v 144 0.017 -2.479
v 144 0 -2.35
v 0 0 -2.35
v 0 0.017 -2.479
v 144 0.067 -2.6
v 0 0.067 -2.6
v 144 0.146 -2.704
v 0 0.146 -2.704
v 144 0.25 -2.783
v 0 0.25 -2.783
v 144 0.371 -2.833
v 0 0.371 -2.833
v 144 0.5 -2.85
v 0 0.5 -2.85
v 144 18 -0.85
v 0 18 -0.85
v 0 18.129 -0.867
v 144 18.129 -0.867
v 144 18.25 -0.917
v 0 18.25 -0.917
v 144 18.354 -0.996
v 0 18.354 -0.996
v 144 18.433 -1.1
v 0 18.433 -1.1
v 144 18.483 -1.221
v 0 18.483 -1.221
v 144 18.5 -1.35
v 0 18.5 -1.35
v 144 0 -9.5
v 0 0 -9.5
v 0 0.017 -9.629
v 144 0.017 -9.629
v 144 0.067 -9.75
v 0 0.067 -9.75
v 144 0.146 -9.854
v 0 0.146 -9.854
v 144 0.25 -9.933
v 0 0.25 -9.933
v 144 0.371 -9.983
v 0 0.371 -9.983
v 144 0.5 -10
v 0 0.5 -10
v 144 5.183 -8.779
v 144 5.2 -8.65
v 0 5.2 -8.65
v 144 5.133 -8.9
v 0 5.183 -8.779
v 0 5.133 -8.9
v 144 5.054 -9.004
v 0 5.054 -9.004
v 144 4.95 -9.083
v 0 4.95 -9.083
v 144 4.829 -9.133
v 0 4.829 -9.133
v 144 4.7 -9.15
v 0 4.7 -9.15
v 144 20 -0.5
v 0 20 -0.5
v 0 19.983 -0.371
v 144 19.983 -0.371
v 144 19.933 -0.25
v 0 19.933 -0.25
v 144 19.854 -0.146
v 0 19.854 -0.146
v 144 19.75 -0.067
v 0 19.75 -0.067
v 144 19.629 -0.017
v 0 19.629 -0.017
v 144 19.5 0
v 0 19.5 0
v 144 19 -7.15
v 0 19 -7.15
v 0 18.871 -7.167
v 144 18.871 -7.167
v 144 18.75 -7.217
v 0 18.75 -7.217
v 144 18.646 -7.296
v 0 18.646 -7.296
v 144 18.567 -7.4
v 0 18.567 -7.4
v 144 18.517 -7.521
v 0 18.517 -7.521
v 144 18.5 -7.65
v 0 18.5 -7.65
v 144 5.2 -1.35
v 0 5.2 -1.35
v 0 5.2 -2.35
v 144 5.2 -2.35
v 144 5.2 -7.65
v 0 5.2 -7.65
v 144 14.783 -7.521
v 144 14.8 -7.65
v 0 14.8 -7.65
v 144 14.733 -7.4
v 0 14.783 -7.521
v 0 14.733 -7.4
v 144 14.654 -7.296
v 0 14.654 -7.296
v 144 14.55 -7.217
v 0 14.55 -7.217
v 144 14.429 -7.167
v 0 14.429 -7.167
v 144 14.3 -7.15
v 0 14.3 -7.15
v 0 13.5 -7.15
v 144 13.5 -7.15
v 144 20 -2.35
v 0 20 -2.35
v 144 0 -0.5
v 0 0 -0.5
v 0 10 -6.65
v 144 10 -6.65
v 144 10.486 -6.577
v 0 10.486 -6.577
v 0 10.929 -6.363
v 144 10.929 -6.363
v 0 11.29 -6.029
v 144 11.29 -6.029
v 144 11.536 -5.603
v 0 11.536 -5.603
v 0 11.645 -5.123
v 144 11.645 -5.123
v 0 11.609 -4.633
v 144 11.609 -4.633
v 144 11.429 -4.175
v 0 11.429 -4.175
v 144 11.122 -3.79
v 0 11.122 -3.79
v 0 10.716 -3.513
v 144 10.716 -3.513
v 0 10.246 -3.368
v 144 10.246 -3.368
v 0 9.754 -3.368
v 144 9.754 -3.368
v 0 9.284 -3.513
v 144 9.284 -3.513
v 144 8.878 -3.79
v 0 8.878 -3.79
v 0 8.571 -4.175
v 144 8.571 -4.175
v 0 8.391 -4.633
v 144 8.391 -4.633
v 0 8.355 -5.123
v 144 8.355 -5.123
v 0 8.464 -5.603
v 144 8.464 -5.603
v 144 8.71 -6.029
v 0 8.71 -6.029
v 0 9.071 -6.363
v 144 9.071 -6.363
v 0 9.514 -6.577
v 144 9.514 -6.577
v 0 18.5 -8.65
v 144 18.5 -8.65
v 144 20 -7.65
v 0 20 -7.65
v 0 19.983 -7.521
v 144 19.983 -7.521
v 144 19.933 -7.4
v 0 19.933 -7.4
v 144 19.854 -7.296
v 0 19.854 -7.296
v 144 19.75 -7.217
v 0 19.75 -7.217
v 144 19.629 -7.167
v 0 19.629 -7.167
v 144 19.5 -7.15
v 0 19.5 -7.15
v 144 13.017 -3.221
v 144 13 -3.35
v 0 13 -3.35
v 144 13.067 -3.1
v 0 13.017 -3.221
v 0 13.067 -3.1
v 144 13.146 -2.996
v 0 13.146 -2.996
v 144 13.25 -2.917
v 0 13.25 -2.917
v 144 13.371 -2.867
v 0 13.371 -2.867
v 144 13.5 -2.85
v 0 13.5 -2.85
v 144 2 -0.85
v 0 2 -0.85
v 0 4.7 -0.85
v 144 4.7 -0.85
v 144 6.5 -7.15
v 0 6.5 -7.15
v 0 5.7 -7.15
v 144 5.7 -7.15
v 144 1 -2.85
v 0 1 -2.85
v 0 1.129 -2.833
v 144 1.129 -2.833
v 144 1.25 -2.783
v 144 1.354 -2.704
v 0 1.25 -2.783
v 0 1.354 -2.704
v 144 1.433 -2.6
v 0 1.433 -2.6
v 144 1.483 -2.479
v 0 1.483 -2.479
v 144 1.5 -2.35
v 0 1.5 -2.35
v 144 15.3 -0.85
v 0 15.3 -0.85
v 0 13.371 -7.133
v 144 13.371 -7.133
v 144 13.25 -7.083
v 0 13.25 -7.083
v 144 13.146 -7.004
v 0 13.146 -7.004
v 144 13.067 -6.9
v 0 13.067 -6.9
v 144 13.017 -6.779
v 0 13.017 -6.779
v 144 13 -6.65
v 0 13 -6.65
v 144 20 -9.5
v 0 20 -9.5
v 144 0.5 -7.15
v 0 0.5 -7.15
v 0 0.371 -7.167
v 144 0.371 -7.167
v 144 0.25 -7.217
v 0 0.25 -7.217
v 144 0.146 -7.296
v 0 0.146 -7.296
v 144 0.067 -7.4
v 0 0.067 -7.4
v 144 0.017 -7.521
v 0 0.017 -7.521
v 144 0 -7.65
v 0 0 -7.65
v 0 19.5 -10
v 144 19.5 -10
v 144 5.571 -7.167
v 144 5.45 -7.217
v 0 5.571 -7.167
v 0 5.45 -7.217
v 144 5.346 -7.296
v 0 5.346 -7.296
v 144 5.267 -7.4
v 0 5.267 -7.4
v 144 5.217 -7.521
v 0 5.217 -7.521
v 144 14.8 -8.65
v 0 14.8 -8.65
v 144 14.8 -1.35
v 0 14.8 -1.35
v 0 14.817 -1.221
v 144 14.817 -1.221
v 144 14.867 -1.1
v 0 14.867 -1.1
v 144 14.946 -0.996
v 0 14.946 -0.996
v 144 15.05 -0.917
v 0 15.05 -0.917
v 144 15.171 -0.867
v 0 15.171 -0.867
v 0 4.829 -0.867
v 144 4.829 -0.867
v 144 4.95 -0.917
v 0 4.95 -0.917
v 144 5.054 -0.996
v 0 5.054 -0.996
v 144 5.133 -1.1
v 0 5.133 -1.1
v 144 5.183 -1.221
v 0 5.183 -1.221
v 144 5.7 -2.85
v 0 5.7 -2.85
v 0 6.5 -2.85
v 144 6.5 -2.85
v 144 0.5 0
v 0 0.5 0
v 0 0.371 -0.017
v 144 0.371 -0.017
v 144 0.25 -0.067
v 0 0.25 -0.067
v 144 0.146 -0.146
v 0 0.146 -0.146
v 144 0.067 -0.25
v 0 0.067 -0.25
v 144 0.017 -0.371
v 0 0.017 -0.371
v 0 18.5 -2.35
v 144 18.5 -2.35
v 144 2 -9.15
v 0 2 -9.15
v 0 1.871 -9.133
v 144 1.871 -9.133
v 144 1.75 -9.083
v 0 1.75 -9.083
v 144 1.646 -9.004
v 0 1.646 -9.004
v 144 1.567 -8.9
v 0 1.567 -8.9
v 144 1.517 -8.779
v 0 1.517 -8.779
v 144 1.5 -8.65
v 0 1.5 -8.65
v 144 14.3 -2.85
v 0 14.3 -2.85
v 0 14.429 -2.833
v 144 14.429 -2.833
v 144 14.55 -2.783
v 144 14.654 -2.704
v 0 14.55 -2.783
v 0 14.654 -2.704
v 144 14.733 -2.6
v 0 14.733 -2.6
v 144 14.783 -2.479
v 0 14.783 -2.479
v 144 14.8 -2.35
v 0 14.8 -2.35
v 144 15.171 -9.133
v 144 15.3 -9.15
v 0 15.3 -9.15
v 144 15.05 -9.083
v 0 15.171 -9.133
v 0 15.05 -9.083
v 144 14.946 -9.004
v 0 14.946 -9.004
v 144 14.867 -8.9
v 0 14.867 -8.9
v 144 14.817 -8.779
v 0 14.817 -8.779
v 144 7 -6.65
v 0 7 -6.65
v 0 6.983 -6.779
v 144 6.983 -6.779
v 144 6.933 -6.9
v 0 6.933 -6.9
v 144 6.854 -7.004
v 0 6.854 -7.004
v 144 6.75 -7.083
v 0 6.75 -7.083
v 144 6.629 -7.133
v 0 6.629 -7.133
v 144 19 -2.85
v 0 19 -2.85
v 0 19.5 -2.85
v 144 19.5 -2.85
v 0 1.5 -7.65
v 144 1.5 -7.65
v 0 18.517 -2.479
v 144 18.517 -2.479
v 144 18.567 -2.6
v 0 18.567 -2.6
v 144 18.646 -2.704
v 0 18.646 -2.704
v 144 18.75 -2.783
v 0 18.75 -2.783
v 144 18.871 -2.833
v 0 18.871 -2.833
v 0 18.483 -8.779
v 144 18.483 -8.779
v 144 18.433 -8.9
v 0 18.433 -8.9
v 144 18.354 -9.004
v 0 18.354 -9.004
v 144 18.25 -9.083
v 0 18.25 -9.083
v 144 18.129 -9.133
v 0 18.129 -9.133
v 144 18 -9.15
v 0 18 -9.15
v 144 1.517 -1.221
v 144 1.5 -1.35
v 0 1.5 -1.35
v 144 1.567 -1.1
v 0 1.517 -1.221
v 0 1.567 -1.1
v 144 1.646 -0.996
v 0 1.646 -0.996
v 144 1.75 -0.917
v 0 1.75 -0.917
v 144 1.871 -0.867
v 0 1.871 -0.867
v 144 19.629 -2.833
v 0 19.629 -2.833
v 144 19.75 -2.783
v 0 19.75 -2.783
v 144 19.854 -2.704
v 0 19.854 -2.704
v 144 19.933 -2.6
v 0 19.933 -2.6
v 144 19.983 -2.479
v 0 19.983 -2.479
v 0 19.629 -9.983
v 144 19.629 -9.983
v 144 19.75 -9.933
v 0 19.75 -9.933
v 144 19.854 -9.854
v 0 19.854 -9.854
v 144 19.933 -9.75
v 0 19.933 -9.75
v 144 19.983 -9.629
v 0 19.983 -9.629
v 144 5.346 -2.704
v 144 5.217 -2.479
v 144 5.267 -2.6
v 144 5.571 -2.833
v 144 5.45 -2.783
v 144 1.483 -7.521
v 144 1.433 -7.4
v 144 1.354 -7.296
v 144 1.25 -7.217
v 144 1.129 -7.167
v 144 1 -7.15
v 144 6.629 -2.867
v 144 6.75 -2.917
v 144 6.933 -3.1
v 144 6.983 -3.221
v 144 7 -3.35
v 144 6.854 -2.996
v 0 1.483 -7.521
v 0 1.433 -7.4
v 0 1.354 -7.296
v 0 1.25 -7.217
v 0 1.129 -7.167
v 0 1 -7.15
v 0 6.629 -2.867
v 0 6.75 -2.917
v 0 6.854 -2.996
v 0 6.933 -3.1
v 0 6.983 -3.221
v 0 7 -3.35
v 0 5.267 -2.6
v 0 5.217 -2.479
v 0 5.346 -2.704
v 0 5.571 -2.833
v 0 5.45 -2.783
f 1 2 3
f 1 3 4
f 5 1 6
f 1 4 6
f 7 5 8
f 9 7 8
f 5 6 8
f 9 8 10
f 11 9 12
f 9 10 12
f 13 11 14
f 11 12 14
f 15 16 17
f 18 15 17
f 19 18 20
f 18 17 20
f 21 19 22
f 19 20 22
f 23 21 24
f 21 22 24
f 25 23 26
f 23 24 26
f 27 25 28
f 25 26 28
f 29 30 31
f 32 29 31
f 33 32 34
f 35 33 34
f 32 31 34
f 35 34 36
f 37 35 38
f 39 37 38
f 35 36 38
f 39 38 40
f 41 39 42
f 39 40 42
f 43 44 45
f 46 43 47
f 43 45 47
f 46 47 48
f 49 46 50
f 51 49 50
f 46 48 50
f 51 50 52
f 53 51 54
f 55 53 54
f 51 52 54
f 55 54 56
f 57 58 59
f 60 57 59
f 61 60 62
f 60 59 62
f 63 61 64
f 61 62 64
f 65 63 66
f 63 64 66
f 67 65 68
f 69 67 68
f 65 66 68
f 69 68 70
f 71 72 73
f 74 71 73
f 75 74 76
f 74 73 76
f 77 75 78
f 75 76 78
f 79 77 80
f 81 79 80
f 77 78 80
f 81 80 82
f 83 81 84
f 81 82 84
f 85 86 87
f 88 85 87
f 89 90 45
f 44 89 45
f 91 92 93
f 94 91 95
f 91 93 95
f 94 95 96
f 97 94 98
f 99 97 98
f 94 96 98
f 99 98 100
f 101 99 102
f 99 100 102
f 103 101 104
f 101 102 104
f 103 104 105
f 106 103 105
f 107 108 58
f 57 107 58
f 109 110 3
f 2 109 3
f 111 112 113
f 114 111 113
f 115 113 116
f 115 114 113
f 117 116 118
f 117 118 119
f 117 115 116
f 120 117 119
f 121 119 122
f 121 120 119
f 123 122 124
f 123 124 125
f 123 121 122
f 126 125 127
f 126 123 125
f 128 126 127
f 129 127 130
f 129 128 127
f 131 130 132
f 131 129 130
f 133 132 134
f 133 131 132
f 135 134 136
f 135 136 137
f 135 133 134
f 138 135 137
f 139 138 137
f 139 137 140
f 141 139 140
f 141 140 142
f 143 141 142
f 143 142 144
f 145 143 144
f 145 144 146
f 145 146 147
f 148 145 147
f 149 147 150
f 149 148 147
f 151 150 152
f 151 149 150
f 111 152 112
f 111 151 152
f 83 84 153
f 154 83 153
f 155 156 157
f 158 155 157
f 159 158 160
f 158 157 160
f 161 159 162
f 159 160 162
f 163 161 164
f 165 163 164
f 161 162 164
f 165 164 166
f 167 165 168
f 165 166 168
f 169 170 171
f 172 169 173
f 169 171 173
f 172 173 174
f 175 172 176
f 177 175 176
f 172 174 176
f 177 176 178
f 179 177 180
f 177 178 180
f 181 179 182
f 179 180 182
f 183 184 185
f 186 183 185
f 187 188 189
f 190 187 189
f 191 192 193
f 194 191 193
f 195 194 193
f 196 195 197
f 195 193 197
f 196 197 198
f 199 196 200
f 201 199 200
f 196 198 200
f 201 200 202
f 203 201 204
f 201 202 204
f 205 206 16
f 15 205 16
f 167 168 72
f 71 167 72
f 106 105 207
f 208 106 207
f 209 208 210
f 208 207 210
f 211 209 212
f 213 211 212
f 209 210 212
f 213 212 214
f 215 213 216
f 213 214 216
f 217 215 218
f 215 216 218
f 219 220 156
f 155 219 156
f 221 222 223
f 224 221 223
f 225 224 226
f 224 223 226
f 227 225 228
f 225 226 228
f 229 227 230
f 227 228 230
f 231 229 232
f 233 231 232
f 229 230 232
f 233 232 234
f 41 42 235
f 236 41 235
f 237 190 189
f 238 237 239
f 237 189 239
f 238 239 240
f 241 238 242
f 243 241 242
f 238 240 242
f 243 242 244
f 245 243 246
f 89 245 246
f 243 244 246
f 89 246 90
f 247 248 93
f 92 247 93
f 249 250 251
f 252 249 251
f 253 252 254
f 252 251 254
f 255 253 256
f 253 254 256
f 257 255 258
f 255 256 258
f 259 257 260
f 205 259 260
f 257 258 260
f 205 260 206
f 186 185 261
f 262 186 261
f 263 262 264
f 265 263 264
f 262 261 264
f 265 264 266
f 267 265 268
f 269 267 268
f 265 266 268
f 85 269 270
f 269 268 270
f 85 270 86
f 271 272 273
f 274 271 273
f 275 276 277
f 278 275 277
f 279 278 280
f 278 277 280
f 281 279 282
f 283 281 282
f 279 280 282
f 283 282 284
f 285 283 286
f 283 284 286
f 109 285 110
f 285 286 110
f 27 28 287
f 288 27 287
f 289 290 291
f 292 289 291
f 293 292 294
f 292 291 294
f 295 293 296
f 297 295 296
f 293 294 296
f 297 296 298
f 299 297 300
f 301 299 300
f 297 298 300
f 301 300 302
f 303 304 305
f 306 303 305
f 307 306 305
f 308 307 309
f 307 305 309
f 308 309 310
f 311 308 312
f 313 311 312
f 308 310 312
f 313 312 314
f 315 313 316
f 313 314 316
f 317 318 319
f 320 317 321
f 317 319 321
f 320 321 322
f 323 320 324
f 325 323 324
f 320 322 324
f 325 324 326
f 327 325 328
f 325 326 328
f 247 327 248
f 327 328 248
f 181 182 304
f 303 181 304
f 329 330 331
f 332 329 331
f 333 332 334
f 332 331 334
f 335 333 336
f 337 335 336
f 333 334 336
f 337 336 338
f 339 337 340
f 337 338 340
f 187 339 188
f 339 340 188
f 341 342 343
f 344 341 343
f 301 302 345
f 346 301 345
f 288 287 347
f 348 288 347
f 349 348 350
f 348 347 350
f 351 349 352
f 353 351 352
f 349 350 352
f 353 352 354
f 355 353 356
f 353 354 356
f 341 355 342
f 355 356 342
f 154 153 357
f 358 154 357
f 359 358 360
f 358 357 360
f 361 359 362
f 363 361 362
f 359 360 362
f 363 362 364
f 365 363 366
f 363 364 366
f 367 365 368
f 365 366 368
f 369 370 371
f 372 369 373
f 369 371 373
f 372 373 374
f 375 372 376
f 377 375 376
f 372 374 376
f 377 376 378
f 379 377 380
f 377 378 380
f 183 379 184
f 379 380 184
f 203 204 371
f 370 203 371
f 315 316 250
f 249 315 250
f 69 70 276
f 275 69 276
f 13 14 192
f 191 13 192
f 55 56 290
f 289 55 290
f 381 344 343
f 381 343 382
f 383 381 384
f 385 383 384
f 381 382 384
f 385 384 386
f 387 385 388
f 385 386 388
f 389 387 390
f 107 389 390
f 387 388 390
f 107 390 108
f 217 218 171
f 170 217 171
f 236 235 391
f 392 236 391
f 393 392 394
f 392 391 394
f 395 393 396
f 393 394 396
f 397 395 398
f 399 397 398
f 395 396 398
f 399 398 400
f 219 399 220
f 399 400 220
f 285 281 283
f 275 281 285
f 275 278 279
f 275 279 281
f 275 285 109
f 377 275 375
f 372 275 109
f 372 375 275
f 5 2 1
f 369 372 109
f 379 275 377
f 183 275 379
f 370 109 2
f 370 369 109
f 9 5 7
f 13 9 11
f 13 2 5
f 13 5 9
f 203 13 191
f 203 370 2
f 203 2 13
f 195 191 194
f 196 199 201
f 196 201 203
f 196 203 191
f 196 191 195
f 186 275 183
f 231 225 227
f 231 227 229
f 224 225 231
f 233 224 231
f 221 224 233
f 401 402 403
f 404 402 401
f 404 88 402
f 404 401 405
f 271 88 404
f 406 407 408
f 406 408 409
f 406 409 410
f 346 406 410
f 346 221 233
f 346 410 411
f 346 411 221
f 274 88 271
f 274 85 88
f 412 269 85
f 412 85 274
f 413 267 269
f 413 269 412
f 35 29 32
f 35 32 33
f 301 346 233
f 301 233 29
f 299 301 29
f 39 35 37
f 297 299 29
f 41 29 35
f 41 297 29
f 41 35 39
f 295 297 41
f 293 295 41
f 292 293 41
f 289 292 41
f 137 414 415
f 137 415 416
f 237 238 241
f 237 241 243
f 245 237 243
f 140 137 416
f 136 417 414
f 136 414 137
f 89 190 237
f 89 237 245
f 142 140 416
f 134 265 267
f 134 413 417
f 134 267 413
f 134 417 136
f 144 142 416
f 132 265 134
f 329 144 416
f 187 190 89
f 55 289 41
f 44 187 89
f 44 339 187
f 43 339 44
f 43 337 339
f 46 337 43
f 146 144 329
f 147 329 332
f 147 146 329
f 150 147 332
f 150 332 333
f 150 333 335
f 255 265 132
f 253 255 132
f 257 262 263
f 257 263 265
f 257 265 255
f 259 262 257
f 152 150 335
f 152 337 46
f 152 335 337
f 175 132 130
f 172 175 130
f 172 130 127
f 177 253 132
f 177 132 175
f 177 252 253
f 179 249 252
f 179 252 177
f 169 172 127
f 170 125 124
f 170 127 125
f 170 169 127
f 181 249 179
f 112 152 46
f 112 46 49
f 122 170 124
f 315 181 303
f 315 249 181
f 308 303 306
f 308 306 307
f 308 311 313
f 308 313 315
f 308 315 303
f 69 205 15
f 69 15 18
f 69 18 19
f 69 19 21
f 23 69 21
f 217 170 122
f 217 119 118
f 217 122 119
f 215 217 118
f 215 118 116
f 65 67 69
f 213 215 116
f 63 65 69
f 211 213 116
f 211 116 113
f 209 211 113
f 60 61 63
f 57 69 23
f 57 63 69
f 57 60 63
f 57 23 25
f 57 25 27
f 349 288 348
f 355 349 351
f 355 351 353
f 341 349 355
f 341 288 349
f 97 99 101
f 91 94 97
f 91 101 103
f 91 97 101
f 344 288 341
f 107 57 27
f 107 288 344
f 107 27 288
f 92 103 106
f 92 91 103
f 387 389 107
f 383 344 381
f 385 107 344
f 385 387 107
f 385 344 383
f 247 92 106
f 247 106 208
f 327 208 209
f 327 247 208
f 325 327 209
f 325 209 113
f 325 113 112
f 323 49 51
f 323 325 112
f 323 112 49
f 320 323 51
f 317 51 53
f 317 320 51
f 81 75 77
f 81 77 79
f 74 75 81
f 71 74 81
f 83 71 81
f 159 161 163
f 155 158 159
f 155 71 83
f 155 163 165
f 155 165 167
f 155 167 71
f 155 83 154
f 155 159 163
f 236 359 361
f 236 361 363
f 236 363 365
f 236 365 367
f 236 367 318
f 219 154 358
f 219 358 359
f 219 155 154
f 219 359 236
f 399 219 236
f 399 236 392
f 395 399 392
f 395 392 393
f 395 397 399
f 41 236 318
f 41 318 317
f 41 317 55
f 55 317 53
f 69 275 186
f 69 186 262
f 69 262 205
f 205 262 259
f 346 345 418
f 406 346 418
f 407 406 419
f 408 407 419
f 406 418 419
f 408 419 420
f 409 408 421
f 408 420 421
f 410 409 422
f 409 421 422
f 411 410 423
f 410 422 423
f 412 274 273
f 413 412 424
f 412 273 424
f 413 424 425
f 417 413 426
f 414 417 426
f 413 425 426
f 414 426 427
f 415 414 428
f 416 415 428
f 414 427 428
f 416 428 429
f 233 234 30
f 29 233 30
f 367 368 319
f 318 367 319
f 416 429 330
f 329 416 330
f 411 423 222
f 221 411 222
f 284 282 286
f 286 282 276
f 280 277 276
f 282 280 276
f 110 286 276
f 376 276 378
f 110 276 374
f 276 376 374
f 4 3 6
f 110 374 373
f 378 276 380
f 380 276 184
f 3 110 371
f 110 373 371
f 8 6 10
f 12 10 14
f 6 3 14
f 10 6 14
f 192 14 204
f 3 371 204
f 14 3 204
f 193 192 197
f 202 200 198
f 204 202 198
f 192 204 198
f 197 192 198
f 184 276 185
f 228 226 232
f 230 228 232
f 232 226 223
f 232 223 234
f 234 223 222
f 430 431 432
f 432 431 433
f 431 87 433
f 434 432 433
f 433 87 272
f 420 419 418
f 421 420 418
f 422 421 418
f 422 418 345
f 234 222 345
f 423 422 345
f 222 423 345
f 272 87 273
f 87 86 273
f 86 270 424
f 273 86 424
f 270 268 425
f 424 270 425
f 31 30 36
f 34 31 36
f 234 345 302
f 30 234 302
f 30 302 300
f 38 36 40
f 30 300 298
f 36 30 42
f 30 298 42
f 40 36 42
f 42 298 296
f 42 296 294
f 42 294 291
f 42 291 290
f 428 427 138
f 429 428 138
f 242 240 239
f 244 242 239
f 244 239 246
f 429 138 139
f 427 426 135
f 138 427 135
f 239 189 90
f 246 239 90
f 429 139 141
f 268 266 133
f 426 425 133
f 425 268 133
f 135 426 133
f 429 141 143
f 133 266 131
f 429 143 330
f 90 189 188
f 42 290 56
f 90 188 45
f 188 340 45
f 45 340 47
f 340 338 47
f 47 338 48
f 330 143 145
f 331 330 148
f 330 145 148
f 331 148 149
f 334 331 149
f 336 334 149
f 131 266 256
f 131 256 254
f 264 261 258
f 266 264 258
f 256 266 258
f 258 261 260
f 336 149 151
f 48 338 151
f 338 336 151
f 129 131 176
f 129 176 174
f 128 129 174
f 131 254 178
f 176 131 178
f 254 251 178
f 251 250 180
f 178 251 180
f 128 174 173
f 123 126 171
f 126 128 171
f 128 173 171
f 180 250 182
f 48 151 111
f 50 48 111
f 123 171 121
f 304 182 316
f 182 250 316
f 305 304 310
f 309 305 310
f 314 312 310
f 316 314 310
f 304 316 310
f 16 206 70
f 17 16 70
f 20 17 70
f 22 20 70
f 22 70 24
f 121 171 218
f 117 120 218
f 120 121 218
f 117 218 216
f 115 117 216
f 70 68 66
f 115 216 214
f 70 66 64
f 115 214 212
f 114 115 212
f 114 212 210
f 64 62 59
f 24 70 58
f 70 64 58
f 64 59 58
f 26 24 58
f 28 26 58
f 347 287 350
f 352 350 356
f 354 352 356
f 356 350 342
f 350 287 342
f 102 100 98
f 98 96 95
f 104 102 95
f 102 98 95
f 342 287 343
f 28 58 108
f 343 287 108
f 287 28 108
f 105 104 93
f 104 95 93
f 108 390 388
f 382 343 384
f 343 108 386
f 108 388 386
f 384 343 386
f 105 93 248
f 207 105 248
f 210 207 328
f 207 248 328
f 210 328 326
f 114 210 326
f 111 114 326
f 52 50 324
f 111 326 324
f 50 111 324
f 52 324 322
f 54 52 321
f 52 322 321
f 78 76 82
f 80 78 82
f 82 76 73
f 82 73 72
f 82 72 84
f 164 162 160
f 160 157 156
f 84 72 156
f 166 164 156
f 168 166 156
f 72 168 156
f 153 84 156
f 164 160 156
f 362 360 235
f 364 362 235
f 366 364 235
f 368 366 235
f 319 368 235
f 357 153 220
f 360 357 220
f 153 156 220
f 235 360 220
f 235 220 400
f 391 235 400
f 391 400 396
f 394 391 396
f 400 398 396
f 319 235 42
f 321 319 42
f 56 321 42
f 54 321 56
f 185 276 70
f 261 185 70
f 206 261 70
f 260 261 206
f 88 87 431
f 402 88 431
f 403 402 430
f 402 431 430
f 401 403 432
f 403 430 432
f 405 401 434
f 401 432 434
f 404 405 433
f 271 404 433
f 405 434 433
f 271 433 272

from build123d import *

# Parameters (mm, degrees)
SKETCH_1_R      = 1.65
EXTRUDE_1_DEPTH = 144


with BuildPart() as part:
    # ｽｹｯﾁ1 → ﾎﾞｽ - 押し出し1 (new body)
    with BuildSketch(Plane(origin=(0, 0, 0), x_dir=(0, 0, -1), z_dir=(1, 0, 0))):
        with BuildLine():
            Line((0.5, 0), (2.35, 0))
            ThreePointArc((2.35, 0), (2.703553391, 0.146446609), (2.85, 0.5))
            Line((2.85, 0.5), (2.85, 1))
            ThreePointArc((2.85, 1), (2.703553391, 1.353553391), (2.35, 1.5))
            Line((2.35, 1.5), (1.35, 1.5))
            ThreePointArc((1.35, 1.5), (0.996446609, 1.646446609), (0.85, 2))
            Line((0.85, 2), (0.85, 4.7))
            ThreePointArc((0.85, 4.7), (0.996446609, 5.053553391), (1.35, 5.2))
            Line((1.35, 5.2), (2.35, 5.2))
            ThreePointArc((2.35, 5.2), (2.703553391, 5.346446609), (2.85, 5.7))
            Line((2.85, 5.7), (2.85, 6.5))
            ThreePointArc((2.85, 6.5), (2.996446609, 6.853553391), (3.35, 7))
            Line((3.35, 7), (6.65, 7))
            ThreePointArc((6.65, 7), (7.003553391, 6.853553391), (7.15, 6.5))
            Line((7.15, 6.5), (7.15, 5.7))
            ThreePointArc((7.15, 5.7), (7.296446609, 5.346446609), (7.65, 5.2))
            Line((7.65, 5.2), (8.65, 5.2))
            ThreePointArc((8.65, 5.2), (9.003553391, 5.053553391), (9.15, 4.7))
            Line((9.15, 4.7), (9.15, 2))
            ThreePointArc((9.15, 2), (9.003553391, 1.646446609), (8.65, 1.5))
            Line((8.65, 1.5), (7.65, 1.5))
            ThreePointArc((7.65, 1.5), (7.296446609, 1.353553391), (7.15, 1))
            Line((7.15, 1), (7.15, 0.5))
            ThreePointArc((7.15, 0.5), (7.296446609, 0.146446609), (7.65, 0))
            Line((7.65, 0), (9.5, 0))
            ThreePointArc((9.5, 0), (9.853553391, 0.146446609), (10, 0.5))
            Line((10, 0.5), (10, 19.5))
            ThreePointArc((10, 19.5), (9.853553391, 19.853553391), (9.5, 20))
            Line((9.5, 20), (7.65, 20))
            ThreePointArc((7.65, 20), (7.296446609, 19.853553391), (7.15, 19.5))
            Line((7.15, 19.5), (7.15, 19))
            ThreePointArc((7.15, 19), (7.296446609, 18.646446609), (7.65, 18.5))
            Line((7.65, 18.5), (8.65, 18.5))
            ThreePointArc((8.65, 18.5), (9.003553391, 18.353553391), (9.15, 18))
            Line((9.15, 18), (9.15, 15.3))
            ThreePointArc((9.15, 15.3), (9.003553391, 14.946446609), (8.65, 14.8))
            Line((8.65, 14.8), (7.65, 14.8))
            ThreePointArc((7.65, 14.8), (7.296446609, 14.653553391), (7.15, 14.3))
            Line((7.15, 14.3), (7.15, 13.5))
            ThreePointArc((7.15, 13.5), (7.003553391, 13.146446609), (6.65, 13))
            Line((6.65, 13), (3.35, 13))
            ThreePointArc((3.35, 13), (2.996446609, 13.146446609), (2.85, 13.5))
            Line((2.85, 13.5), (2.85, 14.3))
            ThreePointArc((2.85, 14.3), (2.703553391, 14.653553391), (2.35, 14.8))
            Line((2.35, 14.8), (1.35, 14.8))
            ThreePointArc((1.35, 14.8), (0.996446609, 14.946446609), (0.85, 15.3))
            Line((0.85, 15.3), (0.85, 18))
            ThreePointArc((0.85, 18), (0.996446609, 18.353553391), (1.35, 18.5))
            Line((1.35, 18.5), (2.35, 18.5))
            ThreePointArc((2.35, 18.5), (2.703553391, 18.646446609), (2.85, 19))
            Line((2.85, 19), (2.85, 19.5))
            ThreePointArc((2.85, 19.5), (2.703553391, 19.853553391), (2.35, 20))
            Line((2.35, 20), (0.5, 20))
            ThreePointArc((0.5, 20), (0.146446609, 19.853553391), (0, 19.5))
            Line((0, 19.5), (0, 0.5))
            ThreePointArc((0, 0.5), (0.146446609, 0.146446609), (0.5, 0))
        make_face()
        with Locations((5, 10)):
            Circle(SKETCH_1_R, mode=Mode.SUBTRACT)
    extrude(amount=EXTRUDE_1_DEPTH)


solid = part.part
